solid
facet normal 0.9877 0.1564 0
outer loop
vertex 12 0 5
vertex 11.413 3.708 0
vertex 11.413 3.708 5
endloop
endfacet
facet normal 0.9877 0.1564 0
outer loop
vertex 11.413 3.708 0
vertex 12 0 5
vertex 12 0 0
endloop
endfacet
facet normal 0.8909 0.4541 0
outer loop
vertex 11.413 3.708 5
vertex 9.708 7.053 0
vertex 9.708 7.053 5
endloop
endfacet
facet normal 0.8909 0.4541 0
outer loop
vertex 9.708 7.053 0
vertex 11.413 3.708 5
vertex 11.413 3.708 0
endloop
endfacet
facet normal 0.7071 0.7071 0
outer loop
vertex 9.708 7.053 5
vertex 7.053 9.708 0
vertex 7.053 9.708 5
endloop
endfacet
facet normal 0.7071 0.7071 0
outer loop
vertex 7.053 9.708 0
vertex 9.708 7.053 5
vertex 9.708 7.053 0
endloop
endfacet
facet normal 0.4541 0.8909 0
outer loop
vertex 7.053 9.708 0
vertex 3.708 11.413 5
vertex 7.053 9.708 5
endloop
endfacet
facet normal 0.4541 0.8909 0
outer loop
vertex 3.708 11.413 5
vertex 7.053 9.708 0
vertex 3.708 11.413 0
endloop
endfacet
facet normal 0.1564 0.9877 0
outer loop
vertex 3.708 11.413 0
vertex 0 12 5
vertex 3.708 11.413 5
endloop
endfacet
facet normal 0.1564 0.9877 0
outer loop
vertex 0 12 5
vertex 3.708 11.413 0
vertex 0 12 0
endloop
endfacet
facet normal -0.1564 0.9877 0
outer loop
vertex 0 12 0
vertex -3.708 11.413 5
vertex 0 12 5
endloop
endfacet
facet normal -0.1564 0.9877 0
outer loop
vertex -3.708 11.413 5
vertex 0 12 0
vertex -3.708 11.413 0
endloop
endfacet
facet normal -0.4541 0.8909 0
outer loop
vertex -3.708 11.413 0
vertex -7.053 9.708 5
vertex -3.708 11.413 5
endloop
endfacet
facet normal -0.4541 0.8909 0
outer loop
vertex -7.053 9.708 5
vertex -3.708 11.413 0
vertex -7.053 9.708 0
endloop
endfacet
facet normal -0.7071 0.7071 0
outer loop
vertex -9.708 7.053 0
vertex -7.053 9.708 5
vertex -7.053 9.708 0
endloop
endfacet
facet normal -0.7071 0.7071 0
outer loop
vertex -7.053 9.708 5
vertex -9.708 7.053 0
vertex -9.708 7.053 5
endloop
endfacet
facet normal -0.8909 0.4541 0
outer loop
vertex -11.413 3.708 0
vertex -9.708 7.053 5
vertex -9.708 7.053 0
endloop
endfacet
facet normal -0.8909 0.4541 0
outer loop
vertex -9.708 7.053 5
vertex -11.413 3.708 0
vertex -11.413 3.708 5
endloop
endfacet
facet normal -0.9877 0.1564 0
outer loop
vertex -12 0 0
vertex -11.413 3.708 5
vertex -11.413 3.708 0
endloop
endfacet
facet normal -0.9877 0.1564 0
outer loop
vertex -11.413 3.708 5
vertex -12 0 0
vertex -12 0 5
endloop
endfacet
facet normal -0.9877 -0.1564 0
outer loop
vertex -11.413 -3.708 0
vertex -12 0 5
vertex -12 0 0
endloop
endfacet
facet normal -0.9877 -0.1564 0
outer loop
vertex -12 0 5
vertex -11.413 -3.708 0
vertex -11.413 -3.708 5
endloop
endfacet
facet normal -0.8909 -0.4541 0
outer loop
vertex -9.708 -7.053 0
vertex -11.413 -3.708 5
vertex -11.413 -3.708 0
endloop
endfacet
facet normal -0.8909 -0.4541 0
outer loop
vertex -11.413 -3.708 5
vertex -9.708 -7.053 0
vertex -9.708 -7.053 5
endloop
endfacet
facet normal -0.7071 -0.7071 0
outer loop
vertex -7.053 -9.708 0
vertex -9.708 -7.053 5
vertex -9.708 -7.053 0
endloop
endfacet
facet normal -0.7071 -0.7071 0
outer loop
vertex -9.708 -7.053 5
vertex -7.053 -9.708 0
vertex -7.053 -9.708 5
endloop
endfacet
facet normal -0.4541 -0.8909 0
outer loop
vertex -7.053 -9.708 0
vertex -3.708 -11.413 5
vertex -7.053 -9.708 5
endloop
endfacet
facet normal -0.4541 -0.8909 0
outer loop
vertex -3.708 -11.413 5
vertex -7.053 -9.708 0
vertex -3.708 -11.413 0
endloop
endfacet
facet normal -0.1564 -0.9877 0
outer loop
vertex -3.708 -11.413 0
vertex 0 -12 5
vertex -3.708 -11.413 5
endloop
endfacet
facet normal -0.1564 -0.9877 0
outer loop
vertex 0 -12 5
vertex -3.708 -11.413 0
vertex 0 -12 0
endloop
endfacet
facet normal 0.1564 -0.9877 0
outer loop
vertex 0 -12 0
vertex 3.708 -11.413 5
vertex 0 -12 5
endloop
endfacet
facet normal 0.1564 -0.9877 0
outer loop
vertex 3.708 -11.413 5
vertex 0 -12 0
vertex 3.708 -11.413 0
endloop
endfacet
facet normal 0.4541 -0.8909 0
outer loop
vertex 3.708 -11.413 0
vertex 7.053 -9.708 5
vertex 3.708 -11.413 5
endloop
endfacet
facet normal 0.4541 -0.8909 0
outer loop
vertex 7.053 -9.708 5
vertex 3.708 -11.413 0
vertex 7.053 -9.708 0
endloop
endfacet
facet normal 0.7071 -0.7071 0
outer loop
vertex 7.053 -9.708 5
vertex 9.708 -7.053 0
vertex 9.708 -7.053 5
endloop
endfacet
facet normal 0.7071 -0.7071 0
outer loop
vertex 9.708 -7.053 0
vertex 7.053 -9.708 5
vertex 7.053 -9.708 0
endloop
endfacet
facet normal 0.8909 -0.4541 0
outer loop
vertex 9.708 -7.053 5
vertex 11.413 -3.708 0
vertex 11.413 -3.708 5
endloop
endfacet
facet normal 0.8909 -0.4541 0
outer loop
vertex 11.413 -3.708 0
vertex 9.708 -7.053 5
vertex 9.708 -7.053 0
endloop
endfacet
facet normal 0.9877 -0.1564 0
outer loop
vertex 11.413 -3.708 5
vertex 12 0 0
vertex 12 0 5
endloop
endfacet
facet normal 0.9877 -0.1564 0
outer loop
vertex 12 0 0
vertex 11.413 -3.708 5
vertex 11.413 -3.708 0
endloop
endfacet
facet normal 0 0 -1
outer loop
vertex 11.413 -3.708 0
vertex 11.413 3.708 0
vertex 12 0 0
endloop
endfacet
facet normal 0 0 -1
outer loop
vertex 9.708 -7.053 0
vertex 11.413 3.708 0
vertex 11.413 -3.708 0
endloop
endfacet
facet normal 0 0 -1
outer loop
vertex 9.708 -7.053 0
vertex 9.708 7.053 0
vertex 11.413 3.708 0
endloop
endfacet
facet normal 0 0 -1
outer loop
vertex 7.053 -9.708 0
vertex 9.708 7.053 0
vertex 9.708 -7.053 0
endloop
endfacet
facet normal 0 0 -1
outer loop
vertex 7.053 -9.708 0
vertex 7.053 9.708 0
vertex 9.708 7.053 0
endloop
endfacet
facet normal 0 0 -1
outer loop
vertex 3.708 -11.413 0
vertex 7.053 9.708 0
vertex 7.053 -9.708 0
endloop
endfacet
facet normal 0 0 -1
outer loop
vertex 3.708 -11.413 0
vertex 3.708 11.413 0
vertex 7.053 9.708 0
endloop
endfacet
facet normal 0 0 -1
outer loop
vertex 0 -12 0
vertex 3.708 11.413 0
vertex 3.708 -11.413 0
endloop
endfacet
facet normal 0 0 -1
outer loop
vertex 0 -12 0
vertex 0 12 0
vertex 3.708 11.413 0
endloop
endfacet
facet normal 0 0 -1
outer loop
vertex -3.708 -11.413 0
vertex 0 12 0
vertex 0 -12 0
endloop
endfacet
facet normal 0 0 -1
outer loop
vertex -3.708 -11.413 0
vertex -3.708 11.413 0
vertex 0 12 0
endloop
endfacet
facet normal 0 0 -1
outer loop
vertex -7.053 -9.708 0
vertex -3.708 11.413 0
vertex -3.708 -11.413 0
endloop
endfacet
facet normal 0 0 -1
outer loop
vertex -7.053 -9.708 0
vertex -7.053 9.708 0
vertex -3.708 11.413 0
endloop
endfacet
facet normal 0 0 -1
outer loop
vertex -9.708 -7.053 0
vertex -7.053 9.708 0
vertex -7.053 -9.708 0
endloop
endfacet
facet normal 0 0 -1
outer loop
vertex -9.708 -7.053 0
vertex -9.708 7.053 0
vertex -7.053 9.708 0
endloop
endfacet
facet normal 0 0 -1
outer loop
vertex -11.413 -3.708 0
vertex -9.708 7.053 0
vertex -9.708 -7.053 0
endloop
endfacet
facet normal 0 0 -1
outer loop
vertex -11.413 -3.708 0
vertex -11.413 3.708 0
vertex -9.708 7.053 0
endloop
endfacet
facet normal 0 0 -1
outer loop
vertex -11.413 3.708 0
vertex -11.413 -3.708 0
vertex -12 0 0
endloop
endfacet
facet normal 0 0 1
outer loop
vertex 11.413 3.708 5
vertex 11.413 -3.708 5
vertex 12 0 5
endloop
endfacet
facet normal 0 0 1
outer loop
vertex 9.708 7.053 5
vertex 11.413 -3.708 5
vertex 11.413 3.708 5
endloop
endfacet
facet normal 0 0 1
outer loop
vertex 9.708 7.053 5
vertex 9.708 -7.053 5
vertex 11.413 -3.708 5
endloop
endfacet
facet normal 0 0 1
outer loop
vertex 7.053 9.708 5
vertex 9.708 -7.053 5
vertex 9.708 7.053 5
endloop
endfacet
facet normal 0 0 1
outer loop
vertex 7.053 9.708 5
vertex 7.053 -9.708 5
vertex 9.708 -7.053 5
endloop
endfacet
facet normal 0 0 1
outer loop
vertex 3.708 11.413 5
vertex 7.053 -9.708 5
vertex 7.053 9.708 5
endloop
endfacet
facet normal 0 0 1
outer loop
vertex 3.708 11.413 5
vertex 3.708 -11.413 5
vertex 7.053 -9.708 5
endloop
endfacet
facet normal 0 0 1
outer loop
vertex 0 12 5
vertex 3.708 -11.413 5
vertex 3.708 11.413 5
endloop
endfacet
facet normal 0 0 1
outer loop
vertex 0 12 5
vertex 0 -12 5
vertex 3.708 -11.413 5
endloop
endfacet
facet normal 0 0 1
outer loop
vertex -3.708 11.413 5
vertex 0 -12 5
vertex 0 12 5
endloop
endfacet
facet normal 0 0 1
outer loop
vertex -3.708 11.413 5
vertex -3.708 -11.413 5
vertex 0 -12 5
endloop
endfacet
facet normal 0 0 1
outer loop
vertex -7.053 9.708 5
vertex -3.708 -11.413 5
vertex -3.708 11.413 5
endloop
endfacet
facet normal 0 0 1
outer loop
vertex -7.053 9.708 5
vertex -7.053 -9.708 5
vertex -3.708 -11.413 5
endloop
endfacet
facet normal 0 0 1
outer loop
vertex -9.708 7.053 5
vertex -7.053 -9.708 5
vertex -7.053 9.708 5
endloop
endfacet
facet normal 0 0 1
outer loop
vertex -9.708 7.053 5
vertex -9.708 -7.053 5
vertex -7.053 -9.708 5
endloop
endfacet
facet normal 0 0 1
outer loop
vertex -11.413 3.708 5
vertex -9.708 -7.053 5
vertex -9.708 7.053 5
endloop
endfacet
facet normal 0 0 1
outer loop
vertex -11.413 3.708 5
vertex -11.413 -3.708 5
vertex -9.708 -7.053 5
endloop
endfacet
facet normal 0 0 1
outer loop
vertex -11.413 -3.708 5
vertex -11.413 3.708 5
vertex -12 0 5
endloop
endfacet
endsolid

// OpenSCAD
//The diameter of the flue.
diameter = 24.0;
height = 5;

/* [OpenSCAD] [Quality] */
$fn = 20;

module CylinderDispenser_Dispenser_Hearth_Inner(diameter, height){
	cylinder(d=diameter, h=height);
}

CylinderDispenser_Dispenser_Hearth_Inner(diameter, height);
